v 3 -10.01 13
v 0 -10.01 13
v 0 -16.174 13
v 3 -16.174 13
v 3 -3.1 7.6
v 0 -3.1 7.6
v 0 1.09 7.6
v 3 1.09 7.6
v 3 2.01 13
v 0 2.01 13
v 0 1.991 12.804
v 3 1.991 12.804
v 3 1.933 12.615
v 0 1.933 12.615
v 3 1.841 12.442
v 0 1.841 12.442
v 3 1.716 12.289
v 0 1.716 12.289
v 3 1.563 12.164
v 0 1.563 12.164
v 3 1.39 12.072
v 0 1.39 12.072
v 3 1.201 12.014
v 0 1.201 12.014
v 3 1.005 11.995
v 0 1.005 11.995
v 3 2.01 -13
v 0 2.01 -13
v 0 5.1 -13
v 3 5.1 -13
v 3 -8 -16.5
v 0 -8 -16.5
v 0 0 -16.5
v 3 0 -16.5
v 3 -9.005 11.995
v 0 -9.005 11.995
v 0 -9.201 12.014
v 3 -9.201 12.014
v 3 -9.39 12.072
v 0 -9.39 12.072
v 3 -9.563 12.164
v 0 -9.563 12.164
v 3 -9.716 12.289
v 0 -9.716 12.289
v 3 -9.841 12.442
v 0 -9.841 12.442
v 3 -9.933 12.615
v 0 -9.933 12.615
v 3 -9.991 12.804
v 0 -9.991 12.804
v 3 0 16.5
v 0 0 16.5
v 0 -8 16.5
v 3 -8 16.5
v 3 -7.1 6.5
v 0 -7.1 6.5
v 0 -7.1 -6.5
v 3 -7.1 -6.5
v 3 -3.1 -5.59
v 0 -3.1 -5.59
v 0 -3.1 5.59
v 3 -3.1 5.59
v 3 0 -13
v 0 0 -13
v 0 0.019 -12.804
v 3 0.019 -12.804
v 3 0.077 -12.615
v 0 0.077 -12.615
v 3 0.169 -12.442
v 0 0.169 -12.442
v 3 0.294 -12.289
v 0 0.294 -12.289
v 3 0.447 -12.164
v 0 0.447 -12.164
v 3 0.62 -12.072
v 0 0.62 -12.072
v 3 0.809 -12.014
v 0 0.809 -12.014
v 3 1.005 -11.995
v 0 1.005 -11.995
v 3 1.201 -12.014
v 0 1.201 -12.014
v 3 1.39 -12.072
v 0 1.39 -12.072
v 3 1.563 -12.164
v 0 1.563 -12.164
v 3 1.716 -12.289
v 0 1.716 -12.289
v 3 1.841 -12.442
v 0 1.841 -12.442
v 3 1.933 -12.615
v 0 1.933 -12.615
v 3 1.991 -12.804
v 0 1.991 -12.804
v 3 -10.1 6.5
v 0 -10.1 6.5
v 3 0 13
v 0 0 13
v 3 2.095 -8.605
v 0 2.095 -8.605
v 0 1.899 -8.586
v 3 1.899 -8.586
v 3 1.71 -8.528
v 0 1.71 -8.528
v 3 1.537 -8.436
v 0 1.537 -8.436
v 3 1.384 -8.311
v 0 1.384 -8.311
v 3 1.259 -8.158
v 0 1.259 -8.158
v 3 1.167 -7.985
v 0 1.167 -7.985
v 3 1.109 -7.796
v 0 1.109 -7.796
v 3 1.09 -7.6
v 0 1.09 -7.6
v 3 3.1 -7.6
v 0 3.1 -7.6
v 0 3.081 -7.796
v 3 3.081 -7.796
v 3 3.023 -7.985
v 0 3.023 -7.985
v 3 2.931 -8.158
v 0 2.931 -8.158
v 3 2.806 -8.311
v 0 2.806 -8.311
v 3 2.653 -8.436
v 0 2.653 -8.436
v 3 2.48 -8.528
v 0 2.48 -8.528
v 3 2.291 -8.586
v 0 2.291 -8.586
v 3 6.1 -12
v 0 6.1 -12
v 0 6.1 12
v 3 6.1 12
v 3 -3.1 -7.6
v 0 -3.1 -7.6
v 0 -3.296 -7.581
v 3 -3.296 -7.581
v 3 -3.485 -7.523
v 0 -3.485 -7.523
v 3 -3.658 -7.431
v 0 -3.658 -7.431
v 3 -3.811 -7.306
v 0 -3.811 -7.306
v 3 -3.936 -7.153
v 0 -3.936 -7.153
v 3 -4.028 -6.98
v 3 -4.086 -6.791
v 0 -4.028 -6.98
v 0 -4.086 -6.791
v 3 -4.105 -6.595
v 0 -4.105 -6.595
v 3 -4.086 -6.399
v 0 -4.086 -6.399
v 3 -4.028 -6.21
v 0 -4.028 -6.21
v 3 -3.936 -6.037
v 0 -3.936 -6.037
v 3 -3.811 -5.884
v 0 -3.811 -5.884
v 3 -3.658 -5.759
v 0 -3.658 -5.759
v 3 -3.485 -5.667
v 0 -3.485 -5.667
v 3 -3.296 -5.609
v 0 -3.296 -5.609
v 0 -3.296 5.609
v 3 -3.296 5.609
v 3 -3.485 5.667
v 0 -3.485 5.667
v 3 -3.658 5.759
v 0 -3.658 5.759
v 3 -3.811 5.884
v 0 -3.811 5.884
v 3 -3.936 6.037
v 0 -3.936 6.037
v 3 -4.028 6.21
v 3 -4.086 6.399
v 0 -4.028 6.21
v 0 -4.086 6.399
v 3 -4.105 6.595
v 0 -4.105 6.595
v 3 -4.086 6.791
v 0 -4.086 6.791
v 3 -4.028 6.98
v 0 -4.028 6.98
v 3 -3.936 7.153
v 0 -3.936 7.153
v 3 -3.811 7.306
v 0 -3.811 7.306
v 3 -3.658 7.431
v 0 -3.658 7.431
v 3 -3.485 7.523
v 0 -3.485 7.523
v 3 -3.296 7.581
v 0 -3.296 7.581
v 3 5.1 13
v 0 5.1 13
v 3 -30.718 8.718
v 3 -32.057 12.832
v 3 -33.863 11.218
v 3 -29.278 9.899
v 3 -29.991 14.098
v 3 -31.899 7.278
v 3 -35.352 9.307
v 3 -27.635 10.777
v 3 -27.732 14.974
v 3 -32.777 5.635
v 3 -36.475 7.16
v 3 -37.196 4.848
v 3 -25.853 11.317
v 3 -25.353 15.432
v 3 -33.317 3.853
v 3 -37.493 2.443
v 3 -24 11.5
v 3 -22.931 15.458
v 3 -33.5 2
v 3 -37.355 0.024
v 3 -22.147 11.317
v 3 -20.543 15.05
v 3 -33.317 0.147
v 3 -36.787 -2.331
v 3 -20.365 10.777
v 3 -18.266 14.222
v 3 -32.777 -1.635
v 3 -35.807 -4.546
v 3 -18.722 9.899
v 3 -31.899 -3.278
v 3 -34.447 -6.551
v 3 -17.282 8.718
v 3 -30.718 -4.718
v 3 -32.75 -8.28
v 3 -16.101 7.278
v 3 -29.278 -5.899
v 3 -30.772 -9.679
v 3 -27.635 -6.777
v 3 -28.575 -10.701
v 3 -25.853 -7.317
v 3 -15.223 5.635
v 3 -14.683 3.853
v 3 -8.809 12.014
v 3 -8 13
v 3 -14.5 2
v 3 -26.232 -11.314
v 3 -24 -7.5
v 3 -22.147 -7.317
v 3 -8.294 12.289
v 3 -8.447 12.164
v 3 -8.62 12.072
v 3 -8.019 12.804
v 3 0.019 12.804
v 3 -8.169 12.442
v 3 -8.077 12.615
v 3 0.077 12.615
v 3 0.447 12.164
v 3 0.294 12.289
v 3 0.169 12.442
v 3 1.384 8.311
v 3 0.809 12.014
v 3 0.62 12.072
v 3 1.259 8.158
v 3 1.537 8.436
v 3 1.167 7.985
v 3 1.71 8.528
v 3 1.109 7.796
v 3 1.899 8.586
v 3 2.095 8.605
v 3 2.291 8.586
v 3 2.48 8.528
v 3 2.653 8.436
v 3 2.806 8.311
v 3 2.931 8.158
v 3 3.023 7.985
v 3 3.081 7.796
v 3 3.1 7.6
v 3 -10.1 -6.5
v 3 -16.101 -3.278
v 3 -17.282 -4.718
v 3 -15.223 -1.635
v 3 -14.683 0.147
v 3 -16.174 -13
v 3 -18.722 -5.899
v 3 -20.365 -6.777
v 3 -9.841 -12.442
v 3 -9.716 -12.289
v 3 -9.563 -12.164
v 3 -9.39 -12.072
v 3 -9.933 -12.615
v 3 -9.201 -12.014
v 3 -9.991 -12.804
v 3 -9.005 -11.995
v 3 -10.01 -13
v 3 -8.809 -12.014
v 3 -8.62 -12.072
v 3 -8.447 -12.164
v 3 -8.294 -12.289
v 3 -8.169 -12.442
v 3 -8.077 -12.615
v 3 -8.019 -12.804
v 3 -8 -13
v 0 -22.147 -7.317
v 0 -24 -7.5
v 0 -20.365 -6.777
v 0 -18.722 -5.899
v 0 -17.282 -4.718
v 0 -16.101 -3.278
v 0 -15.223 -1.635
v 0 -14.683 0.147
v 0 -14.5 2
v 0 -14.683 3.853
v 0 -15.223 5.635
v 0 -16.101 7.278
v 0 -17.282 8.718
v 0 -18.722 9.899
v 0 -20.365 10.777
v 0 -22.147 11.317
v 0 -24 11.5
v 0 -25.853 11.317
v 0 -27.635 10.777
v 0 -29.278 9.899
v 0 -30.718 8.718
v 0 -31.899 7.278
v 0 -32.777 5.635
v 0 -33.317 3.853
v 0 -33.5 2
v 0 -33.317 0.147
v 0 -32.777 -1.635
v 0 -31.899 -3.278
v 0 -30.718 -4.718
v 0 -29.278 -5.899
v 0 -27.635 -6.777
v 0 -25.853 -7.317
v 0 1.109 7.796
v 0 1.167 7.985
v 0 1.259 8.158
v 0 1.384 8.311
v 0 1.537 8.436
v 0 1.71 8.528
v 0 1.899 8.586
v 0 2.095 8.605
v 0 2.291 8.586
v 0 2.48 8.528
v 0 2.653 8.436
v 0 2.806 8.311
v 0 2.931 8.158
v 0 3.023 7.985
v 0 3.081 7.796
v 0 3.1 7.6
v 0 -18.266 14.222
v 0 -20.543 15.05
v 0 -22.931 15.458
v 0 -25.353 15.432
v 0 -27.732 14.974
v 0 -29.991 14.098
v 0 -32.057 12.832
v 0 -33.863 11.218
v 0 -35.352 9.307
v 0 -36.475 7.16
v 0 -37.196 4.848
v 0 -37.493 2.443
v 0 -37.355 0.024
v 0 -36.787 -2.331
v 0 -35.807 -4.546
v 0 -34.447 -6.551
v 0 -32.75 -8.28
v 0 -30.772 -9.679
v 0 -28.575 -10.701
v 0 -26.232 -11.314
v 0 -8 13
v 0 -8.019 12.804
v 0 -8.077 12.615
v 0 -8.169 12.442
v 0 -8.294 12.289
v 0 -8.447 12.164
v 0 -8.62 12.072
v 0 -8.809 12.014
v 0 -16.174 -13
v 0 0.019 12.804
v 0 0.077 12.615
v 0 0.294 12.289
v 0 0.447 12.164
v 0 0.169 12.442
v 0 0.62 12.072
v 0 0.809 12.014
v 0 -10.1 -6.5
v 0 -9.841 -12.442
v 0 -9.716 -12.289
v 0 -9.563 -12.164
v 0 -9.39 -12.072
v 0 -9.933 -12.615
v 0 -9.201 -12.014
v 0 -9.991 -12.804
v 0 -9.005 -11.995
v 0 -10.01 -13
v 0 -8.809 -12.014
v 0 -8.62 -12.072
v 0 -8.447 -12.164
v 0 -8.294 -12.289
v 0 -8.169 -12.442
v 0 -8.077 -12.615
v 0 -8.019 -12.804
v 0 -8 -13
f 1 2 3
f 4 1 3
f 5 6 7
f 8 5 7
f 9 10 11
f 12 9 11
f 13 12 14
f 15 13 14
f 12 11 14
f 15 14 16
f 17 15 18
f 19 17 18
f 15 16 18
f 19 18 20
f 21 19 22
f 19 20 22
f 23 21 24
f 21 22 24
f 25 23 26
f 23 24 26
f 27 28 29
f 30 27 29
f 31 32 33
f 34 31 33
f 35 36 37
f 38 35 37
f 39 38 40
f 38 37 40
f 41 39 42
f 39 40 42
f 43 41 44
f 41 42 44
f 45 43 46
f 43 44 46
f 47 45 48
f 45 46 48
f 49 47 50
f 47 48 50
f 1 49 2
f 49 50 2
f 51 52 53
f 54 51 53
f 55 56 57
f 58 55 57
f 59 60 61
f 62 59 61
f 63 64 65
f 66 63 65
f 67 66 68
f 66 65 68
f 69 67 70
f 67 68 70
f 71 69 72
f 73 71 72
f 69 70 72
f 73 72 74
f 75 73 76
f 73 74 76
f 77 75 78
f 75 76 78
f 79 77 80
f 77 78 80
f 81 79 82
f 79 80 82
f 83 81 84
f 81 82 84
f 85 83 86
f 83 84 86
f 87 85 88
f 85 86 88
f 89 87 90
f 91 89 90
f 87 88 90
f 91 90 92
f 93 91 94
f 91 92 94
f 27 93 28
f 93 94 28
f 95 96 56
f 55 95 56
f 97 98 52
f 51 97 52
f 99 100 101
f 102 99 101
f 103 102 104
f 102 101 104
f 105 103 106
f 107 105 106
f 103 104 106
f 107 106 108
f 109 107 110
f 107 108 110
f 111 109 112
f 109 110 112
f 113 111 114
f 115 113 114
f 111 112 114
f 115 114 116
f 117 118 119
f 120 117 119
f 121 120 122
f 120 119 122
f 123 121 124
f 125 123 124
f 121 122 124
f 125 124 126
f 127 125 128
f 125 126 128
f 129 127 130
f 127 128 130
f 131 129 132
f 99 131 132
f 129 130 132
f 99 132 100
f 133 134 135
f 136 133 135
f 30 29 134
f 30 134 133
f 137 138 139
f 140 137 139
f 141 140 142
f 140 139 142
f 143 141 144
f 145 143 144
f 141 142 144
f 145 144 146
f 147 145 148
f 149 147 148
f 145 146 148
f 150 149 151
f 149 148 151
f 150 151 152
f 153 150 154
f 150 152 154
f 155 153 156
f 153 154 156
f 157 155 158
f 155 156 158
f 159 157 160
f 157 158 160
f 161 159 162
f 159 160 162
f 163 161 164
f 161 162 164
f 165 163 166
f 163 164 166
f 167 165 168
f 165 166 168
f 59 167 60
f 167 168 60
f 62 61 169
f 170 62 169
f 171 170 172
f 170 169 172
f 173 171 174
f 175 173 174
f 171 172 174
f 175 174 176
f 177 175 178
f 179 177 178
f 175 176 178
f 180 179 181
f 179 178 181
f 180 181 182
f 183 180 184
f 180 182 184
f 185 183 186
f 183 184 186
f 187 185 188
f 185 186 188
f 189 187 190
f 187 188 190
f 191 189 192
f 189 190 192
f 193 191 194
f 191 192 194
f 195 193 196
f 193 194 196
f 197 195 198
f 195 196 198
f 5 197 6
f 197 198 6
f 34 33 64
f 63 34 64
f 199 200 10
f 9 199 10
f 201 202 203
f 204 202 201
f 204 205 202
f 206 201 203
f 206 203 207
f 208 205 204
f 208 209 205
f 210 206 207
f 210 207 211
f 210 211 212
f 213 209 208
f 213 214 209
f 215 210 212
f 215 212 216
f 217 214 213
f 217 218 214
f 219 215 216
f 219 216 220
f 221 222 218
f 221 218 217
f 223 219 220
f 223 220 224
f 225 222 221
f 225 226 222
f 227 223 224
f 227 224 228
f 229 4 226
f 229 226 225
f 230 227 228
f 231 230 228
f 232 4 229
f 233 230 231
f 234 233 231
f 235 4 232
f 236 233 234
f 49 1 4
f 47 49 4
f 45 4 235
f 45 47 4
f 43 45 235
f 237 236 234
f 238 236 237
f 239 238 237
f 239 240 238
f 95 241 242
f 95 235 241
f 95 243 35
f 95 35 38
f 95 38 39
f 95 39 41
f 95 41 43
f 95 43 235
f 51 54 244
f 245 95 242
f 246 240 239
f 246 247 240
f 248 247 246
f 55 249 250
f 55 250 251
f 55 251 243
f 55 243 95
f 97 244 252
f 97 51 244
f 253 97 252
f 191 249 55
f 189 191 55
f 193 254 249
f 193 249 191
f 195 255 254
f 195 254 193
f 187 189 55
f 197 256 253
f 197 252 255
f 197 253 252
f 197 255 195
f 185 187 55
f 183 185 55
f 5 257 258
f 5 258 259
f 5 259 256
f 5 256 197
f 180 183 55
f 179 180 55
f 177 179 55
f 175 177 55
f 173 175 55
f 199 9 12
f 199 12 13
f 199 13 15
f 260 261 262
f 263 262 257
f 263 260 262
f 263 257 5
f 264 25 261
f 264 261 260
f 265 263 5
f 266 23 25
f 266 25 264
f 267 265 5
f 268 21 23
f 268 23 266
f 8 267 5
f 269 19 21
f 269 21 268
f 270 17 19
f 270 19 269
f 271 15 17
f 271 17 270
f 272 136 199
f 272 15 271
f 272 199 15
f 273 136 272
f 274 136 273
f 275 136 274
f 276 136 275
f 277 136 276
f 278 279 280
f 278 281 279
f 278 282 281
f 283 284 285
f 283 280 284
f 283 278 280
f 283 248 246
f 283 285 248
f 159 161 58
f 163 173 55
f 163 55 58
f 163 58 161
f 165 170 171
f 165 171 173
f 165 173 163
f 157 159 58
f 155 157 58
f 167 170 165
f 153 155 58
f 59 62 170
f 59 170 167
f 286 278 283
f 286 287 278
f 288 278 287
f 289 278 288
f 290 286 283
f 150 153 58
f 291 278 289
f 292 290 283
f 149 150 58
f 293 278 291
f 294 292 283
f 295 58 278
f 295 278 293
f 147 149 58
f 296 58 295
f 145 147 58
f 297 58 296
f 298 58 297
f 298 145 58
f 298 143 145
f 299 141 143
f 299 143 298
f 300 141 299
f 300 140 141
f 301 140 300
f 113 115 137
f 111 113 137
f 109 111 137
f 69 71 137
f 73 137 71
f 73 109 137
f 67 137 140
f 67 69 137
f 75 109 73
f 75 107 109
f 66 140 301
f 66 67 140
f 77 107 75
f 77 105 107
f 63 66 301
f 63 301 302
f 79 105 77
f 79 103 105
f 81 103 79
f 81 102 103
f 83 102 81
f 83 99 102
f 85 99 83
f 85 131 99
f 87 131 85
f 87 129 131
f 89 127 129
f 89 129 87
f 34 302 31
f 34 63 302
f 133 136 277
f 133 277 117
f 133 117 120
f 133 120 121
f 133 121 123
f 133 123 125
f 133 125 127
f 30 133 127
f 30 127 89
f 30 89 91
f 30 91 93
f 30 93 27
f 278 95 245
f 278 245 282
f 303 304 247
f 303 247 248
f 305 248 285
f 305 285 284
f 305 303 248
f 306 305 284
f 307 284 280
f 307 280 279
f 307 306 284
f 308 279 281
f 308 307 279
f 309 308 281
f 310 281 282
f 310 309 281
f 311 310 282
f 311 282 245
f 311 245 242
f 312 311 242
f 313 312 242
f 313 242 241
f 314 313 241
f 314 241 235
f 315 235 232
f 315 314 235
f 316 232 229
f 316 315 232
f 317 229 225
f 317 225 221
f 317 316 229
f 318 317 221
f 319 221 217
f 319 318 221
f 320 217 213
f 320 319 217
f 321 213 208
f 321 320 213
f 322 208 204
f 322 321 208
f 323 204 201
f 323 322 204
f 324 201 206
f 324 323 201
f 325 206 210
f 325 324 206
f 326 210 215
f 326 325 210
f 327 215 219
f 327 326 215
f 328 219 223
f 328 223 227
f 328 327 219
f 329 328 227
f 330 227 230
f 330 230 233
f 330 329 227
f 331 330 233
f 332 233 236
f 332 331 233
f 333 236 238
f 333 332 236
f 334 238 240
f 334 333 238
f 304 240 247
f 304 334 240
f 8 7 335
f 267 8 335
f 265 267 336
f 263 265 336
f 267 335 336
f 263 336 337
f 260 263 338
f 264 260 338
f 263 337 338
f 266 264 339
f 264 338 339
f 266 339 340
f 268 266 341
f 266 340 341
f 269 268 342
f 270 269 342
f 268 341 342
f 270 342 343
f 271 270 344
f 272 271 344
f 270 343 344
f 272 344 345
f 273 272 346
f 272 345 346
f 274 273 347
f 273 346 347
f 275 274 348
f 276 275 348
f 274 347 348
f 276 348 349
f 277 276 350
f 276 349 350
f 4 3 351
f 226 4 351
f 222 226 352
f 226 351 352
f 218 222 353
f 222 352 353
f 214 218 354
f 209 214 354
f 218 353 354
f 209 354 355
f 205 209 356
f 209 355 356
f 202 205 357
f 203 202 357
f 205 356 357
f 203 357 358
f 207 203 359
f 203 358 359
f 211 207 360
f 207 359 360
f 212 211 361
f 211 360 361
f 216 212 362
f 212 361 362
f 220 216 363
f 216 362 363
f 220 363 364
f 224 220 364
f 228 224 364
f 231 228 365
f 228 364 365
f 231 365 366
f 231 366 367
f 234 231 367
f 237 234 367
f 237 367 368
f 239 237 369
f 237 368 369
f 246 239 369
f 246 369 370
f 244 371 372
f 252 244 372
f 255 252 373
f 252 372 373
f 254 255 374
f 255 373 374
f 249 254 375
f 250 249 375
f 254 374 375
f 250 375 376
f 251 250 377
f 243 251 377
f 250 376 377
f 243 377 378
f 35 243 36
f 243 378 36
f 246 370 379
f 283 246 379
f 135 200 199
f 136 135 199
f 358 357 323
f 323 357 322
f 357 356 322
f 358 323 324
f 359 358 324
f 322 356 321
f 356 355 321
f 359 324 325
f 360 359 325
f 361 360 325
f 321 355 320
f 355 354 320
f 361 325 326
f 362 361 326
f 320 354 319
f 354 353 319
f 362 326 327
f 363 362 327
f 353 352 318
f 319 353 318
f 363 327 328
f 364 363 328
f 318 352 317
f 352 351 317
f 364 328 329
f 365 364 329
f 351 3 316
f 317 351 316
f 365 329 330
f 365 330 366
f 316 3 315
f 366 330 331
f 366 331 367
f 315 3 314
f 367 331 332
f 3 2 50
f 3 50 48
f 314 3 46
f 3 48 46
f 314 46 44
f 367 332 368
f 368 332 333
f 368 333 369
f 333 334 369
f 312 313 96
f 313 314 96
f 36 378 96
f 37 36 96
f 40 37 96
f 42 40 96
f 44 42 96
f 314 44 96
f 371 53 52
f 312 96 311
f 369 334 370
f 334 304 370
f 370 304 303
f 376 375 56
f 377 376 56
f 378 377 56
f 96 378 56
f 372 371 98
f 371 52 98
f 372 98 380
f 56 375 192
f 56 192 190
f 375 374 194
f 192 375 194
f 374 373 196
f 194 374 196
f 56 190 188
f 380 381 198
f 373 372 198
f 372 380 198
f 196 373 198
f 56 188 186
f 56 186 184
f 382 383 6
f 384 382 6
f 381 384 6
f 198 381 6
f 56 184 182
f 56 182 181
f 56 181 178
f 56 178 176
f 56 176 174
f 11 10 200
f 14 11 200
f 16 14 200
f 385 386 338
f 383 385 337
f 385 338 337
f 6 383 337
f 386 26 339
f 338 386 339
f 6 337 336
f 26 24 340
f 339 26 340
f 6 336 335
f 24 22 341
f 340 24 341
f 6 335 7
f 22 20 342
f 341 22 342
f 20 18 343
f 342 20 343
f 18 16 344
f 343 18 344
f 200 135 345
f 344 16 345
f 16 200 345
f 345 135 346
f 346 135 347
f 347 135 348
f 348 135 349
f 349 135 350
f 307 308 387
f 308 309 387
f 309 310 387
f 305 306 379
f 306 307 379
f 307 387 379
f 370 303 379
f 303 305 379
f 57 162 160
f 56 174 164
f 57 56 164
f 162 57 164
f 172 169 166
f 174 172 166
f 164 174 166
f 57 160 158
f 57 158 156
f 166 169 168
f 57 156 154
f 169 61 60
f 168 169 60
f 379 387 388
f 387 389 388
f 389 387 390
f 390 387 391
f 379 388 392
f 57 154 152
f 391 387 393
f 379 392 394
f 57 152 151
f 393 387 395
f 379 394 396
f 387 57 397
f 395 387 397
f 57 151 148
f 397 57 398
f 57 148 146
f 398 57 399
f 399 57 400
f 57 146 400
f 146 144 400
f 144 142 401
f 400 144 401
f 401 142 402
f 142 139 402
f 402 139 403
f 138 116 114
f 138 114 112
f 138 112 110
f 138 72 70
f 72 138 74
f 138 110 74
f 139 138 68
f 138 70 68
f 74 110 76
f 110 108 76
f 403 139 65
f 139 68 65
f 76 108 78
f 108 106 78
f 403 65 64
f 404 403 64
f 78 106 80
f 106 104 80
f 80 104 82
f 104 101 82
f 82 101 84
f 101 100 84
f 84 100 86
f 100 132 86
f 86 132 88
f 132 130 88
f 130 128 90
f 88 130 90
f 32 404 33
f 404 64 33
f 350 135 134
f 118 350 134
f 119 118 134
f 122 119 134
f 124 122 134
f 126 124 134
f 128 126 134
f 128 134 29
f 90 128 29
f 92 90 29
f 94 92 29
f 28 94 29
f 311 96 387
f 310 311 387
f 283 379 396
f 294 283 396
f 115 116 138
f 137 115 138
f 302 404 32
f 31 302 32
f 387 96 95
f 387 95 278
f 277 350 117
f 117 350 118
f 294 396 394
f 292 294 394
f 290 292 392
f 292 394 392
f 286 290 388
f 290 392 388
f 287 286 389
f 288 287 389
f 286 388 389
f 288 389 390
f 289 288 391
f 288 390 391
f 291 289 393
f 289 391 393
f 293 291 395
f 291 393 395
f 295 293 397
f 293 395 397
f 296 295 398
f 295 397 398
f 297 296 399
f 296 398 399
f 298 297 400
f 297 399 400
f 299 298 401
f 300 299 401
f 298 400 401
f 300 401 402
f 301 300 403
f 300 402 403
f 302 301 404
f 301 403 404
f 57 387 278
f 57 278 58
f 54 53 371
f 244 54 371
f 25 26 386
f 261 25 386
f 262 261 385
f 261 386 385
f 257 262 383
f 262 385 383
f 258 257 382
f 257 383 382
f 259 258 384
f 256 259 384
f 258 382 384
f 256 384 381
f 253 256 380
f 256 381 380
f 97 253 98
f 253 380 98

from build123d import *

# Parameters (mm, degrees)
SKETCH_1_R      = 9.5
SKETCH_1_W      = 13
SKETCH_1_H      = 3
EXTRUDE_1_DEPTH = 3
CHAMFER_1_SIZE  = 1


with BuildPart() as part:
    # 草图1 → 凸台-拉伸1 (new body)
    with BuildSketch(Plane(origin=(0, 0, 0), x_dir=(0, 0, -1), z_dir=(1, 0, 0))):
        with BuildLine():
            Line((13, 6.1), (-13, 6.1))
            Line((-13, 6.1), (-13, 2.01))
            ThreePointArc((-13, 2.01), (-12.289357685, 1.715642315), (-11.995, 1.005))
            ThreePointArc((-11.995, 1.005), (-12.289357685, 0.294357685), (-13, 0))
            Line((-13, 0), (-16.5, 0))
            Line((-16.5, 0), (-16.5, -8))
            Line((-16.5, -8), (-13, -8))
            ThreePointArc((-13, -8), (-12.289357685, -8.294357685), (-11.995, -9.005))
            ThreePointArc((-11.995, -9.005), (-12.289357685, -9.715642315), (-13, -10.01))
            Line((-13, -10.01), (-13, -16.173762079))
            ThreePointArc((-13, -16.173762079), (-7.16028893, -36.474831388), (11.314290923, -26.231514557))
            Line((11.314290923, -26.231514557), (13, -16.173762079))
            Line((13, -16.173762079), (13, -10.01))
            ThreePointArc((13, -10.01), (11.995, -9.005), (13, -8))
            Line((13, -8), (16.5, -8))
            Line((16.5, -8), (16.5, 0))
            Line((16.5, 0), (13, 0))
            ThreePointArc((13, 0), (11.995, 1.005), (13, 2.01))
            Line((13, 2.01), (13, 6.1))
        make_face()
        with Locations((-2, -24)):
            Circle(SKETCH_1_R, mode=Mode.SUBTRACT)
        with Locations((0, -8.6)):
            Rectangle(SKETCH_1_W, SKETCH_1_H, mode=Mode.SUBTRACT)
        with BuildLine():
            Line((5.59, -3.1), (-5.59, -3.1))
            ThreePointArc((-5.59, -3.1), (-6.595, -4.105), (-7.6, -3.1))
            Line((-7.6, -3.1), (-7.6, 1.09))
            ThreePointArc((-7.6, 1.09), (-8.605, 2.095), (-7.6, 3.1))
            Line((-7.6, 3.1), (7.6, 3.1))
            ThreePointArc((7.6, 3.1), (8.310642315, 2.805642315), (8.605, 2.095))
            ThreePointArc((8.605, 2.095), (8.310642315, 1.384357685), (7.6, 1.09))
            Line((7.6, 1.09), (7.6, -3.1))
            ThreePointArc((7.6, -3.1), (6.595, -4.105), (5.59, -3.1))
        make_face(mode=Mode.SUBTRACT)
    extrude(amount=EXTRUDE_1_DEPTH)

    # 倒角1
    chamfer_1_edges = [part.edges().sort_by_distance(p)[0] for p in [
        (1.5, 6.1, 13),
        (1.5, 6.1, -13),
    ]]
    chamfer(chamfer_1_edges, length=CHAMFER_1_SIZE)


solid = part.part
